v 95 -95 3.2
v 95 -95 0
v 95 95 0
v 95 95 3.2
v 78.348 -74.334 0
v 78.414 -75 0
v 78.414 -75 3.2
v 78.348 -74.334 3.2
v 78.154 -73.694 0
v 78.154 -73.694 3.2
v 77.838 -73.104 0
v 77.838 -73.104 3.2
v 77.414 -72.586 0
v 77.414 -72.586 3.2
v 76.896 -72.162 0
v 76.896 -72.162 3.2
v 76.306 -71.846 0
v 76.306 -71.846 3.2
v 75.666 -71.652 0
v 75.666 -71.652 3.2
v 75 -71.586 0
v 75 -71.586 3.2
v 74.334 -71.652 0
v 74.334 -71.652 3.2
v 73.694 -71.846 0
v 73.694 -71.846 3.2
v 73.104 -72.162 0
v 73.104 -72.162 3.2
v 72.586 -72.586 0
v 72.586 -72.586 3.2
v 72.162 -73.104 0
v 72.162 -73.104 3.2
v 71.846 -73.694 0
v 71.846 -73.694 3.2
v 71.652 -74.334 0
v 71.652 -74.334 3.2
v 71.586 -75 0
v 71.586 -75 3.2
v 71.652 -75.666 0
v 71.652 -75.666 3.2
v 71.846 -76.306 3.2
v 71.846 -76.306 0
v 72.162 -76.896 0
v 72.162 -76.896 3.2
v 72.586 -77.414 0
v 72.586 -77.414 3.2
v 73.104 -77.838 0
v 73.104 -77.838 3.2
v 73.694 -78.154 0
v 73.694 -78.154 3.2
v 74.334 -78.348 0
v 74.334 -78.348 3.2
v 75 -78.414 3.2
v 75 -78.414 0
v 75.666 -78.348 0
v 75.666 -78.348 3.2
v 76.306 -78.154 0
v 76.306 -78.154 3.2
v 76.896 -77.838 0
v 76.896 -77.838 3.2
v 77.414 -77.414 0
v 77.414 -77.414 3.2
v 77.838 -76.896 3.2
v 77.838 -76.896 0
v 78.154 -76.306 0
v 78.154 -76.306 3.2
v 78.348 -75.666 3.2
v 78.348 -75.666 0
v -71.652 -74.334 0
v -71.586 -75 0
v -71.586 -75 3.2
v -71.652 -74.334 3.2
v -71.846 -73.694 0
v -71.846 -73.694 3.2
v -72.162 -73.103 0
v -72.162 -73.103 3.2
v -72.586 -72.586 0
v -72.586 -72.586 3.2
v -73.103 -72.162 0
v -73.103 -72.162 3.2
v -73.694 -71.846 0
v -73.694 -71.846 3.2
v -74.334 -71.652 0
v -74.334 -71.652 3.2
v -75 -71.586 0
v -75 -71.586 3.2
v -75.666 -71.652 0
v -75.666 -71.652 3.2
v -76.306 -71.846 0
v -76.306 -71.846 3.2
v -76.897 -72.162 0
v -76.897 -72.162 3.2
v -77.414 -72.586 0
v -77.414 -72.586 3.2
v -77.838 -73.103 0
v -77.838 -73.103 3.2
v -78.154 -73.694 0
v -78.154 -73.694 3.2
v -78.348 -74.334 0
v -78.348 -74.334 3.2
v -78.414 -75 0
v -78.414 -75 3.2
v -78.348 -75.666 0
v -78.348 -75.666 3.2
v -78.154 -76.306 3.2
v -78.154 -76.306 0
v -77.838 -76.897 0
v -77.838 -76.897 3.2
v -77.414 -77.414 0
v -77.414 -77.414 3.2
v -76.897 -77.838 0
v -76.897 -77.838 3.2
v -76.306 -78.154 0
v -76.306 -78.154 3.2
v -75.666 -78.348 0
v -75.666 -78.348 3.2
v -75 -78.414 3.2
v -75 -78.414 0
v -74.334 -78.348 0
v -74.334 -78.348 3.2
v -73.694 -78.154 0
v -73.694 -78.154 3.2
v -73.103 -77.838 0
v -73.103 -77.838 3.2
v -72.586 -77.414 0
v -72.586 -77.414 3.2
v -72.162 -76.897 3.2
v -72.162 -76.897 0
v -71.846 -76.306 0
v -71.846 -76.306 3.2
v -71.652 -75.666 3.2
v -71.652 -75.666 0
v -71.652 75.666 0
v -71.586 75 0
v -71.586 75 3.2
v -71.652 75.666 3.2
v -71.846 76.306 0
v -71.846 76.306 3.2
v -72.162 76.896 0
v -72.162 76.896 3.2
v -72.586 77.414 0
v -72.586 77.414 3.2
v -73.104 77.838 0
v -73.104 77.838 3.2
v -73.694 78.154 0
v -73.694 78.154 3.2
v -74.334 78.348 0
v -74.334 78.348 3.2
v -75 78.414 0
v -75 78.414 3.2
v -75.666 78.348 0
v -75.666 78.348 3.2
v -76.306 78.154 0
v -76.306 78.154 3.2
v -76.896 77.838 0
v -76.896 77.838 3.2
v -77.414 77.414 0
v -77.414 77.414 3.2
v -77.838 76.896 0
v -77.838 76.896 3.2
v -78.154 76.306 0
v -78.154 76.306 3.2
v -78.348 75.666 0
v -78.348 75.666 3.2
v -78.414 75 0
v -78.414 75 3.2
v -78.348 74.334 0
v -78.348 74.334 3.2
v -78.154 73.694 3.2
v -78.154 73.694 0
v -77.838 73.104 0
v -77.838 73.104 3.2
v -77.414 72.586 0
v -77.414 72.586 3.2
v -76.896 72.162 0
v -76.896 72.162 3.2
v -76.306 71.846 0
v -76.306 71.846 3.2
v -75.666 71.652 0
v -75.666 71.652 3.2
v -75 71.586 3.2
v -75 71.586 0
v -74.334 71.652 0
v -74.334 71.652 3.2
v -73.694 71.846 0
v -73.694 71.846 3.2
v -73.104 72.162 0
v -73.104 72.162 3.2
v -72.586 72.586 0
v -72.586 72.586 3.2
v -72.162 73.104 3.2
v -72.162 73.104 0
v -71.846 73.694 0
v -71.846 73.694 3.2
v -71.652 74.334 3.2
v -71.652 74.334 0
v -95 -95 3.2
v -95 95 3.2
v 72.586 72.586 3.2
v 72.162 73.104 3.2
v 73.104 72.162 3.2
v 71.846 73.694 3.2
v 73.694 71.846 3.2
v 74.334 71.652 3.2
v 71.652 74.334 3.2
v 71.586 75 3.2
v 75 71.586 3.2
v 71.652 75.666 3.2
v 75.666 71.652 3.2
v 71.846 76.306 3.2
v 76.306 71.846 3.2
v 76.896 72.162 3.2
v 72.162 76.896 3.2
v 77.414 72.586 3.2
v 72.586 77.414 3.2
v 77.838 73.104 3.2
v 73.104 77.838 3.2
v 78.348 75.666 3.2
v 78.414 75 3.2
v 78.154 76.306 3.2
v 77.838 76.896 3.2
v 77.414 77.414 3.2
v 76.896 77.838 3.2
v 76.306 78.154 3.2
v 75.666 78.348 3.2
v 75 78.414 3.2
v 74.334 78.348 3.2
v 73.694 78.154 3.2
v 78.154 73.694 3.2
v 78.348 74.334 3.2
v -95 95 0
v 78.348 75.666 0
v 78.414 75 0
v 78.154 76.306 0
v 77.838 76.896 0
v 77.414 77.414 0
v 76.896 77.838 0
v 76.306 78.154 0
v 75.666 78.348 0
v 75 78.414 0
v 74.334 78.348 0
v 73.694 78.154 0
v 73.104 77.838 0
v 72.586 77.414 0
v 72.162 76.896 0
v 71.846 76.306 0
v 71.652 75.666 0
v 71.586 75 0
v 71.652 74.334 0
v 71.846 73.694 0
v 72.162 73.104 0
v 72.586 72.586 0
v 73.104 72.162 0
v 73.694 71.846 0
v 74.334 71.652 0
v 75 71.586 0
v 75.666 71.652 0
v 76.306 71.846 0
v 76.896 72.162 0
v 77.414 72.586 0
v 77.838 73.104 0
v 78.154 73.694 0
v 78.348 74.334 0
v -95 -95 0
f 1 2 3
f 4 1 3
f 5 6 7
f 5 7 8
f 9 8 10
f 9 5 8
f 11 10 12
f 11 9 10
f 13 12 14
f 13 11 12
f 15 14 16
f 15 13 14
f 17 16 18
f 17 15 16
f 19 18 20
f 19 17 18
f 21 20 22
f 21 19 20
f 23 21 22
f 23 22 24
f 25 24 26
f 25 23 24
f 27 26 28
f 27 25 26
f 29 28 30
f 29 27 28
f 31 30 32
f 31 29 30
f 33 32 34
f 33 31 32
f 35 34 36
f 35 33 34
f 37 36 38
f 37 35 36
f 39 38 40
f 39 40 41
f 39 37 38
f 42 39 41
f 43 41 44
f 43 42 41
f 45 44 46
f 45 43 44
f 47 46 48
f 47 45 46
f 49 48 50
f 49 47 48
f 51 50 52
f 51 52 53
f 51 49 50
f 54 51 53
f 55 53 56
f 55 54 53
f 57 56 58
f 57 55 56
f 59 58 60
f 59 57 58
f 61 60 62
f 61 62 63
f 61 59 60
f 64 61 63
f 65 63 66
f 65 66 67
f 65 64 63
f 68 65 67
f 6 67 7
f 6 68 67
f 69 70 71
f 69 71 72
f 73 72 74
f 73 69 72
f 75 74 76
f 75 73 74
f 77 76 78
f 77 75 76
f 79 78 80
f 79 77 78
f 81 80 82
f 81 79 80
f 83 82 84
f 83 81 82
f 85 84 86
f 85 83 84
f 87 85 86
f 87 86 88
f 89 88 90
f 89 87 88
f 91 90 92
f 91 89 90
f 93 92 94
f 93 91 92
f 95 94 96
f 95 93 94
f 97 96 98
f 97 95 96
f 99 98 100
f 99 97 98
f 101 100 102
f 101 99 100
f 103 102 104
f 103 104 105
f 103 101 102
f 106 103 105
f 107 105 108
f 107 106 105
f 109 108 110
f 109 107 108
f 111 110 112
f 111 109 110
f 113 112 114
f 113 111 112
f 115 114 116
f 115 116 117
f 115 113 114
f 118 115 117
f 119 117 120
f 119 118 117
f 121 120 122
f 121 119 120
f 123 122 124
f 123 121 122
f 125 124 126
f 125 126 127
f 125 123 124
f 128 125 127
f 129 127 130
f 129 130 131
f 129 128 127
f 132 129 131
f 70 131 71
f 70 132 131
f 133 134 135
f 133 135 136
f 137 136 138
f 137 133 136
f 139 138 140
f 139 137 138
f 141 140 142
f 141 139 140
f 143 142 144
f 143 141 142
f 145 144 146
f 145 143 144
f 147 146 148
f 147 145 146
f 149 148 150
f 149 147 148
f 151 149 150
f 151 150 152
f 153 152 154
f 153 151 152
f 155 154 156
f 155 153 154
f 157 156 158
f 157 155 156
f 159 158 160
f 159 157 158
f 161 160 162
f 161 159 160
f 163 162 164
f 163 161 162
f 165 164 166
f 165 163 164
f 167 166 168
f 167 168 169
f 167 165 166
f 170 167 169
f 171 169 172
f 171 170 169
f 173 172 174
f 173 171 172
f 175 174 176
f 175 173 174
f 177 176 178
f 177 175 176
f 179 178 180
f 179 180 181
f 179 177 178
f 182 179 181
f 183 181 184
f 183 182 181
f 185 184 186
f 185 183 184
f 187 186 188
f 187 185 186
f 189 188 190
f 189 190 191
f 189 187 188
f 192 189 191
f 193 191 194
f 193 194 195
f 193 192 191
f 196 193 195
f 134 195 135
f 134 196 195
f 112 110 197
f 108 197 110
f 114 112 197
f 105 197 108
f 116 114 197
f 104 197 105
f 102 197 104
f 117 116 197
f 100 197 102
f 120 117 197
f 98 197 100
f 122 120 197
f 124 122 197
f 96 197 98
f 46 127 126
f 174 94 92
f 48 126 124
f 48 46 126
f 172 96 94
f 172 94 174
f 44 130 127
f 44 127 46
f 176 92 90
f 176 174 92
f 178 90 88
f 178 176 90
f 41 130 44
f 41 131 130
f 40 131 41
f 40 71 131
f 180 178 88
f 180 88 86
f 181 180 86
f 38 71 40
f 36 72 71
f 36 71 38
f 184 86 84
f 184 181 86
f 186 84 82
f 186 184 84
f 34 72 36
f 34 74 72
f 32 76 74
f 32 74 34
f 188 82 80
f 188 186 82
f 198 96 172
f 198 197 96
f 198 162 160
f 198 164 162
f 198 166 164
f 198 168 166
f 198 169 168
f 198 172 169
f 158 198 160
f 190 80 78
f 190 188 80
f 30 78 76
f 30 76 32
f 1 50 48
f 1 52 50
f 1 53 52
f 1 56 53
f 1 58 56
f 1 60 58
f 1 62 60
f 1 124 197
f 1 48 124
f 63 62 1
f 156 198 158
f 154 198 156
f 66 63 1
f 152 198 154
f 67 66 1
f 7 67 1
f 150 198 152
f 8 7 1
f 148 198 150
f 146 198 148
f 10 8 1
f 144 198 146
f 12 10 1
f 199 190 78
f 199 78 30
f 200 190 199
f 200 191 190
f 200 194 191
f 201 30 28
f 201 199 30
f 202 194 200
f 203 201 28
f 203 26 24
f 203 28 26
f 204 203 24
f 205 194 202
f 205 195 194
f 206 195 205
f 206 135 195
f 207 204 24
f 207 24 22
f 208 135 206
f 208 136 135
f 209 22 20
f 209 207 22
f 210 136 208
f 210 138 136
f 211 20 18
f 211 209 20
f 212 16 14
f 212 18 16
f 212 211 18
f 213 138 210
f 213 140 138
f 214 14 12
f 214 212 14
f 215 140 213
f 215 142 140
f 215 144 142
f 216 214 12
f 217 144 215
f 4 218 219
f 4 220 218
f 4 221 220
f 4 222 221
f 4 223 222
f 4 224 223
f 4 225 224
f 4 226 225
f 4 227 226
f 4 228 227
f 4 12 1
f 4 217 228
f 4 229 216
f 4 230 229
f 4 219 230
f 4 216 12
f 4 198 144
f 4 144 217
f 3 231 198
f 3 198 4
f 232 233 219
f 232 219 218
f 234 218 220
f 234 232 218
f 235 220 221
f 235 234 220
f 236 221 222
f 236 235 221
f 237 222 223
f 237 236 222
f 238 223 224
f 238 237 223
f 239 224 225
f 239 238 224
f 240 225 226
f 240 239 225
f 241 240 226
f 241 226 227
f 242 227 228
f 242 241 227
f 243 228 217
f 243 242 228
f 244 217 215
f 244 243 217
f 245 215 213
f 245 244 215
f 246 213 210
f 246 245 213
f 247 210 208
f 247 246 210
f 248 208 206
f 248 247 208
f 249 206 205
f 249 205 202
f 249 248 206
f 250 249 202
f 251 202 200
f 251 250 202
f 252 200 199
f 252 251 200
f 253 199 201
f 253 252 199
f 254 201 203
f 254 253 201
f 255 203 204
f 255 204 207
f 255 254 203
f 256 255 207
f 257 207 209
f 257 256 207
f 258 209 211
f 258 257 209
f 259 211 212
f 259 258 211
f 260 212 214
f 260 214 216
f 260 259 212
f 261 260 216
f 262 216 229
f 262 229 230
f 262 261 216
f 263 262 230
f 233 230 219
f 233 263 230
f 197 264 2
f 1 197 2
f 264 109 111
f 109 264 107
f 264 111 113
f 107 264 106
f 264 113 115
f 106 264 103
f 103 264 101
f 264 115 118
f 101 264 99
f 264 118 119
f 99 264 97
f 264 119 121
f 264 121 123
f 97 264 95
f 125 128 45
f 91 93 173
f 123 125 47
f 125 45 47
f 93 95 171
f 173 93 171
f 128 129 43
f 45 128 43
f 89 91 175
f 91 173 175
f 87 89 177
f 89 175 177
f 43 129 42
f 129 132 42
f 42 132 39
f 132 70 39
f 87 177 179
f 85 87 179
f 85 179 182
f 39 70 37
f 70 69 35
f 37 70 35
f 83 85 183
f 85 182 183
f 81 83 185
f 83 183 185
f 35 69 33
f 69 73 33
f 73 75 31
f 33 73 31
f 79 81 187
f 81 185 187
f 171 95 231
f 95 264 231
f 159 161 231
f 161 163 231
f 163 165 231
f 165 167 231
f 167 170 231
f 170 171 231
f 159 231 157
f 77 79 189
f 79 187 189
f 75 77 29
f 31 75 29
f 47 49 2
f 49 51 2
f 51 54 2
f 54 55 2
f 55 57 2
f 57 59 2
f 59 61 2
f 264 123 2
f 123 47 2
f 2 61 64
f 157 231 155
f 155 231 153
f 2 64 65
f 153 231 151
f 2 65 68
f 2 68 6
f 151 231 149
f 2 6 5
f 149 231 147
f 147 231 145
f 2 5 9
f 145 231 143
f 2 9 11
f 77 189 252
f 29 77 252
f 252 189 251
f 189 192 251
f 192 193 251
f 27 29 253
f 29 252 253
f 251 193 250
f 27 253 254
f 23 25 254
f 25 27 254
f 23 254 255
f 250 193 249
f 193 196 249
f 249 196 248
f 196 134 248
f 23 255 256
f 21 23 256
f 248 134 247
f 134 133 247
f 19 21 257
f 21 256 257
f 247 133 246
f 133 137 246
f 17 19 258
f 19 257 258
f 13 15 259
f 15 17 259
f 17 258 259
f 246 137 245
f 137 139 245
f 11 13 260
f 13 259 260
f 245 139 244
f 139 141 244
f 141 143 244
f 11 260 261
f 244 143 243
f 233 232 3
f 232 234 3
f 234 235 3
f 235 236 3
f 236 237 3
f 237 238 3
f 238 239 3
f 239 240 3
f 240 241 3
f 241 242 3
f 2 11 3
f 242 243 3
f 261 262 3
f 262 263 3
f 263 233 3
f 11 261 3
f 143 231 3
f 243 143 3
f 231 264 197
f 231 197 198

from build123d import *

# Parameters (mm, degrees)
F0_W     = 190
F0_H     = 190
F0_R     = 3.413695
F0_R_2   = 3.4135
F0_R_3   = 49.746444
F1_DEPTH = 3.2


with BuildPart() as f1:
    # F0 (on Top) → F1 (new body)
    with BuildSketch(Plane.XY):
        Rectangle(F0_W, F0_H)
        with Locations((-75, -75)):
            Circle(F0_R, mode=Mode.SUBTRACT)
        with Locations((75, -75)):
            Circle(F0_R_2, mode=Mode.SUBTRACT)
        with Locations((-75, 75)):
            Circle(F0_R_2, mode=Mode.SUBTRACT)
        Circle(F0_R_3, mode=Mode.SUBTRACT)
        with Locations((75, 75)):
            Circle(F0_R_2, mode=Mode.SUBTRACT)
        Circle(F0_R_3)
    extrude(amount=F1_DEPTH)


solid = f1.part
